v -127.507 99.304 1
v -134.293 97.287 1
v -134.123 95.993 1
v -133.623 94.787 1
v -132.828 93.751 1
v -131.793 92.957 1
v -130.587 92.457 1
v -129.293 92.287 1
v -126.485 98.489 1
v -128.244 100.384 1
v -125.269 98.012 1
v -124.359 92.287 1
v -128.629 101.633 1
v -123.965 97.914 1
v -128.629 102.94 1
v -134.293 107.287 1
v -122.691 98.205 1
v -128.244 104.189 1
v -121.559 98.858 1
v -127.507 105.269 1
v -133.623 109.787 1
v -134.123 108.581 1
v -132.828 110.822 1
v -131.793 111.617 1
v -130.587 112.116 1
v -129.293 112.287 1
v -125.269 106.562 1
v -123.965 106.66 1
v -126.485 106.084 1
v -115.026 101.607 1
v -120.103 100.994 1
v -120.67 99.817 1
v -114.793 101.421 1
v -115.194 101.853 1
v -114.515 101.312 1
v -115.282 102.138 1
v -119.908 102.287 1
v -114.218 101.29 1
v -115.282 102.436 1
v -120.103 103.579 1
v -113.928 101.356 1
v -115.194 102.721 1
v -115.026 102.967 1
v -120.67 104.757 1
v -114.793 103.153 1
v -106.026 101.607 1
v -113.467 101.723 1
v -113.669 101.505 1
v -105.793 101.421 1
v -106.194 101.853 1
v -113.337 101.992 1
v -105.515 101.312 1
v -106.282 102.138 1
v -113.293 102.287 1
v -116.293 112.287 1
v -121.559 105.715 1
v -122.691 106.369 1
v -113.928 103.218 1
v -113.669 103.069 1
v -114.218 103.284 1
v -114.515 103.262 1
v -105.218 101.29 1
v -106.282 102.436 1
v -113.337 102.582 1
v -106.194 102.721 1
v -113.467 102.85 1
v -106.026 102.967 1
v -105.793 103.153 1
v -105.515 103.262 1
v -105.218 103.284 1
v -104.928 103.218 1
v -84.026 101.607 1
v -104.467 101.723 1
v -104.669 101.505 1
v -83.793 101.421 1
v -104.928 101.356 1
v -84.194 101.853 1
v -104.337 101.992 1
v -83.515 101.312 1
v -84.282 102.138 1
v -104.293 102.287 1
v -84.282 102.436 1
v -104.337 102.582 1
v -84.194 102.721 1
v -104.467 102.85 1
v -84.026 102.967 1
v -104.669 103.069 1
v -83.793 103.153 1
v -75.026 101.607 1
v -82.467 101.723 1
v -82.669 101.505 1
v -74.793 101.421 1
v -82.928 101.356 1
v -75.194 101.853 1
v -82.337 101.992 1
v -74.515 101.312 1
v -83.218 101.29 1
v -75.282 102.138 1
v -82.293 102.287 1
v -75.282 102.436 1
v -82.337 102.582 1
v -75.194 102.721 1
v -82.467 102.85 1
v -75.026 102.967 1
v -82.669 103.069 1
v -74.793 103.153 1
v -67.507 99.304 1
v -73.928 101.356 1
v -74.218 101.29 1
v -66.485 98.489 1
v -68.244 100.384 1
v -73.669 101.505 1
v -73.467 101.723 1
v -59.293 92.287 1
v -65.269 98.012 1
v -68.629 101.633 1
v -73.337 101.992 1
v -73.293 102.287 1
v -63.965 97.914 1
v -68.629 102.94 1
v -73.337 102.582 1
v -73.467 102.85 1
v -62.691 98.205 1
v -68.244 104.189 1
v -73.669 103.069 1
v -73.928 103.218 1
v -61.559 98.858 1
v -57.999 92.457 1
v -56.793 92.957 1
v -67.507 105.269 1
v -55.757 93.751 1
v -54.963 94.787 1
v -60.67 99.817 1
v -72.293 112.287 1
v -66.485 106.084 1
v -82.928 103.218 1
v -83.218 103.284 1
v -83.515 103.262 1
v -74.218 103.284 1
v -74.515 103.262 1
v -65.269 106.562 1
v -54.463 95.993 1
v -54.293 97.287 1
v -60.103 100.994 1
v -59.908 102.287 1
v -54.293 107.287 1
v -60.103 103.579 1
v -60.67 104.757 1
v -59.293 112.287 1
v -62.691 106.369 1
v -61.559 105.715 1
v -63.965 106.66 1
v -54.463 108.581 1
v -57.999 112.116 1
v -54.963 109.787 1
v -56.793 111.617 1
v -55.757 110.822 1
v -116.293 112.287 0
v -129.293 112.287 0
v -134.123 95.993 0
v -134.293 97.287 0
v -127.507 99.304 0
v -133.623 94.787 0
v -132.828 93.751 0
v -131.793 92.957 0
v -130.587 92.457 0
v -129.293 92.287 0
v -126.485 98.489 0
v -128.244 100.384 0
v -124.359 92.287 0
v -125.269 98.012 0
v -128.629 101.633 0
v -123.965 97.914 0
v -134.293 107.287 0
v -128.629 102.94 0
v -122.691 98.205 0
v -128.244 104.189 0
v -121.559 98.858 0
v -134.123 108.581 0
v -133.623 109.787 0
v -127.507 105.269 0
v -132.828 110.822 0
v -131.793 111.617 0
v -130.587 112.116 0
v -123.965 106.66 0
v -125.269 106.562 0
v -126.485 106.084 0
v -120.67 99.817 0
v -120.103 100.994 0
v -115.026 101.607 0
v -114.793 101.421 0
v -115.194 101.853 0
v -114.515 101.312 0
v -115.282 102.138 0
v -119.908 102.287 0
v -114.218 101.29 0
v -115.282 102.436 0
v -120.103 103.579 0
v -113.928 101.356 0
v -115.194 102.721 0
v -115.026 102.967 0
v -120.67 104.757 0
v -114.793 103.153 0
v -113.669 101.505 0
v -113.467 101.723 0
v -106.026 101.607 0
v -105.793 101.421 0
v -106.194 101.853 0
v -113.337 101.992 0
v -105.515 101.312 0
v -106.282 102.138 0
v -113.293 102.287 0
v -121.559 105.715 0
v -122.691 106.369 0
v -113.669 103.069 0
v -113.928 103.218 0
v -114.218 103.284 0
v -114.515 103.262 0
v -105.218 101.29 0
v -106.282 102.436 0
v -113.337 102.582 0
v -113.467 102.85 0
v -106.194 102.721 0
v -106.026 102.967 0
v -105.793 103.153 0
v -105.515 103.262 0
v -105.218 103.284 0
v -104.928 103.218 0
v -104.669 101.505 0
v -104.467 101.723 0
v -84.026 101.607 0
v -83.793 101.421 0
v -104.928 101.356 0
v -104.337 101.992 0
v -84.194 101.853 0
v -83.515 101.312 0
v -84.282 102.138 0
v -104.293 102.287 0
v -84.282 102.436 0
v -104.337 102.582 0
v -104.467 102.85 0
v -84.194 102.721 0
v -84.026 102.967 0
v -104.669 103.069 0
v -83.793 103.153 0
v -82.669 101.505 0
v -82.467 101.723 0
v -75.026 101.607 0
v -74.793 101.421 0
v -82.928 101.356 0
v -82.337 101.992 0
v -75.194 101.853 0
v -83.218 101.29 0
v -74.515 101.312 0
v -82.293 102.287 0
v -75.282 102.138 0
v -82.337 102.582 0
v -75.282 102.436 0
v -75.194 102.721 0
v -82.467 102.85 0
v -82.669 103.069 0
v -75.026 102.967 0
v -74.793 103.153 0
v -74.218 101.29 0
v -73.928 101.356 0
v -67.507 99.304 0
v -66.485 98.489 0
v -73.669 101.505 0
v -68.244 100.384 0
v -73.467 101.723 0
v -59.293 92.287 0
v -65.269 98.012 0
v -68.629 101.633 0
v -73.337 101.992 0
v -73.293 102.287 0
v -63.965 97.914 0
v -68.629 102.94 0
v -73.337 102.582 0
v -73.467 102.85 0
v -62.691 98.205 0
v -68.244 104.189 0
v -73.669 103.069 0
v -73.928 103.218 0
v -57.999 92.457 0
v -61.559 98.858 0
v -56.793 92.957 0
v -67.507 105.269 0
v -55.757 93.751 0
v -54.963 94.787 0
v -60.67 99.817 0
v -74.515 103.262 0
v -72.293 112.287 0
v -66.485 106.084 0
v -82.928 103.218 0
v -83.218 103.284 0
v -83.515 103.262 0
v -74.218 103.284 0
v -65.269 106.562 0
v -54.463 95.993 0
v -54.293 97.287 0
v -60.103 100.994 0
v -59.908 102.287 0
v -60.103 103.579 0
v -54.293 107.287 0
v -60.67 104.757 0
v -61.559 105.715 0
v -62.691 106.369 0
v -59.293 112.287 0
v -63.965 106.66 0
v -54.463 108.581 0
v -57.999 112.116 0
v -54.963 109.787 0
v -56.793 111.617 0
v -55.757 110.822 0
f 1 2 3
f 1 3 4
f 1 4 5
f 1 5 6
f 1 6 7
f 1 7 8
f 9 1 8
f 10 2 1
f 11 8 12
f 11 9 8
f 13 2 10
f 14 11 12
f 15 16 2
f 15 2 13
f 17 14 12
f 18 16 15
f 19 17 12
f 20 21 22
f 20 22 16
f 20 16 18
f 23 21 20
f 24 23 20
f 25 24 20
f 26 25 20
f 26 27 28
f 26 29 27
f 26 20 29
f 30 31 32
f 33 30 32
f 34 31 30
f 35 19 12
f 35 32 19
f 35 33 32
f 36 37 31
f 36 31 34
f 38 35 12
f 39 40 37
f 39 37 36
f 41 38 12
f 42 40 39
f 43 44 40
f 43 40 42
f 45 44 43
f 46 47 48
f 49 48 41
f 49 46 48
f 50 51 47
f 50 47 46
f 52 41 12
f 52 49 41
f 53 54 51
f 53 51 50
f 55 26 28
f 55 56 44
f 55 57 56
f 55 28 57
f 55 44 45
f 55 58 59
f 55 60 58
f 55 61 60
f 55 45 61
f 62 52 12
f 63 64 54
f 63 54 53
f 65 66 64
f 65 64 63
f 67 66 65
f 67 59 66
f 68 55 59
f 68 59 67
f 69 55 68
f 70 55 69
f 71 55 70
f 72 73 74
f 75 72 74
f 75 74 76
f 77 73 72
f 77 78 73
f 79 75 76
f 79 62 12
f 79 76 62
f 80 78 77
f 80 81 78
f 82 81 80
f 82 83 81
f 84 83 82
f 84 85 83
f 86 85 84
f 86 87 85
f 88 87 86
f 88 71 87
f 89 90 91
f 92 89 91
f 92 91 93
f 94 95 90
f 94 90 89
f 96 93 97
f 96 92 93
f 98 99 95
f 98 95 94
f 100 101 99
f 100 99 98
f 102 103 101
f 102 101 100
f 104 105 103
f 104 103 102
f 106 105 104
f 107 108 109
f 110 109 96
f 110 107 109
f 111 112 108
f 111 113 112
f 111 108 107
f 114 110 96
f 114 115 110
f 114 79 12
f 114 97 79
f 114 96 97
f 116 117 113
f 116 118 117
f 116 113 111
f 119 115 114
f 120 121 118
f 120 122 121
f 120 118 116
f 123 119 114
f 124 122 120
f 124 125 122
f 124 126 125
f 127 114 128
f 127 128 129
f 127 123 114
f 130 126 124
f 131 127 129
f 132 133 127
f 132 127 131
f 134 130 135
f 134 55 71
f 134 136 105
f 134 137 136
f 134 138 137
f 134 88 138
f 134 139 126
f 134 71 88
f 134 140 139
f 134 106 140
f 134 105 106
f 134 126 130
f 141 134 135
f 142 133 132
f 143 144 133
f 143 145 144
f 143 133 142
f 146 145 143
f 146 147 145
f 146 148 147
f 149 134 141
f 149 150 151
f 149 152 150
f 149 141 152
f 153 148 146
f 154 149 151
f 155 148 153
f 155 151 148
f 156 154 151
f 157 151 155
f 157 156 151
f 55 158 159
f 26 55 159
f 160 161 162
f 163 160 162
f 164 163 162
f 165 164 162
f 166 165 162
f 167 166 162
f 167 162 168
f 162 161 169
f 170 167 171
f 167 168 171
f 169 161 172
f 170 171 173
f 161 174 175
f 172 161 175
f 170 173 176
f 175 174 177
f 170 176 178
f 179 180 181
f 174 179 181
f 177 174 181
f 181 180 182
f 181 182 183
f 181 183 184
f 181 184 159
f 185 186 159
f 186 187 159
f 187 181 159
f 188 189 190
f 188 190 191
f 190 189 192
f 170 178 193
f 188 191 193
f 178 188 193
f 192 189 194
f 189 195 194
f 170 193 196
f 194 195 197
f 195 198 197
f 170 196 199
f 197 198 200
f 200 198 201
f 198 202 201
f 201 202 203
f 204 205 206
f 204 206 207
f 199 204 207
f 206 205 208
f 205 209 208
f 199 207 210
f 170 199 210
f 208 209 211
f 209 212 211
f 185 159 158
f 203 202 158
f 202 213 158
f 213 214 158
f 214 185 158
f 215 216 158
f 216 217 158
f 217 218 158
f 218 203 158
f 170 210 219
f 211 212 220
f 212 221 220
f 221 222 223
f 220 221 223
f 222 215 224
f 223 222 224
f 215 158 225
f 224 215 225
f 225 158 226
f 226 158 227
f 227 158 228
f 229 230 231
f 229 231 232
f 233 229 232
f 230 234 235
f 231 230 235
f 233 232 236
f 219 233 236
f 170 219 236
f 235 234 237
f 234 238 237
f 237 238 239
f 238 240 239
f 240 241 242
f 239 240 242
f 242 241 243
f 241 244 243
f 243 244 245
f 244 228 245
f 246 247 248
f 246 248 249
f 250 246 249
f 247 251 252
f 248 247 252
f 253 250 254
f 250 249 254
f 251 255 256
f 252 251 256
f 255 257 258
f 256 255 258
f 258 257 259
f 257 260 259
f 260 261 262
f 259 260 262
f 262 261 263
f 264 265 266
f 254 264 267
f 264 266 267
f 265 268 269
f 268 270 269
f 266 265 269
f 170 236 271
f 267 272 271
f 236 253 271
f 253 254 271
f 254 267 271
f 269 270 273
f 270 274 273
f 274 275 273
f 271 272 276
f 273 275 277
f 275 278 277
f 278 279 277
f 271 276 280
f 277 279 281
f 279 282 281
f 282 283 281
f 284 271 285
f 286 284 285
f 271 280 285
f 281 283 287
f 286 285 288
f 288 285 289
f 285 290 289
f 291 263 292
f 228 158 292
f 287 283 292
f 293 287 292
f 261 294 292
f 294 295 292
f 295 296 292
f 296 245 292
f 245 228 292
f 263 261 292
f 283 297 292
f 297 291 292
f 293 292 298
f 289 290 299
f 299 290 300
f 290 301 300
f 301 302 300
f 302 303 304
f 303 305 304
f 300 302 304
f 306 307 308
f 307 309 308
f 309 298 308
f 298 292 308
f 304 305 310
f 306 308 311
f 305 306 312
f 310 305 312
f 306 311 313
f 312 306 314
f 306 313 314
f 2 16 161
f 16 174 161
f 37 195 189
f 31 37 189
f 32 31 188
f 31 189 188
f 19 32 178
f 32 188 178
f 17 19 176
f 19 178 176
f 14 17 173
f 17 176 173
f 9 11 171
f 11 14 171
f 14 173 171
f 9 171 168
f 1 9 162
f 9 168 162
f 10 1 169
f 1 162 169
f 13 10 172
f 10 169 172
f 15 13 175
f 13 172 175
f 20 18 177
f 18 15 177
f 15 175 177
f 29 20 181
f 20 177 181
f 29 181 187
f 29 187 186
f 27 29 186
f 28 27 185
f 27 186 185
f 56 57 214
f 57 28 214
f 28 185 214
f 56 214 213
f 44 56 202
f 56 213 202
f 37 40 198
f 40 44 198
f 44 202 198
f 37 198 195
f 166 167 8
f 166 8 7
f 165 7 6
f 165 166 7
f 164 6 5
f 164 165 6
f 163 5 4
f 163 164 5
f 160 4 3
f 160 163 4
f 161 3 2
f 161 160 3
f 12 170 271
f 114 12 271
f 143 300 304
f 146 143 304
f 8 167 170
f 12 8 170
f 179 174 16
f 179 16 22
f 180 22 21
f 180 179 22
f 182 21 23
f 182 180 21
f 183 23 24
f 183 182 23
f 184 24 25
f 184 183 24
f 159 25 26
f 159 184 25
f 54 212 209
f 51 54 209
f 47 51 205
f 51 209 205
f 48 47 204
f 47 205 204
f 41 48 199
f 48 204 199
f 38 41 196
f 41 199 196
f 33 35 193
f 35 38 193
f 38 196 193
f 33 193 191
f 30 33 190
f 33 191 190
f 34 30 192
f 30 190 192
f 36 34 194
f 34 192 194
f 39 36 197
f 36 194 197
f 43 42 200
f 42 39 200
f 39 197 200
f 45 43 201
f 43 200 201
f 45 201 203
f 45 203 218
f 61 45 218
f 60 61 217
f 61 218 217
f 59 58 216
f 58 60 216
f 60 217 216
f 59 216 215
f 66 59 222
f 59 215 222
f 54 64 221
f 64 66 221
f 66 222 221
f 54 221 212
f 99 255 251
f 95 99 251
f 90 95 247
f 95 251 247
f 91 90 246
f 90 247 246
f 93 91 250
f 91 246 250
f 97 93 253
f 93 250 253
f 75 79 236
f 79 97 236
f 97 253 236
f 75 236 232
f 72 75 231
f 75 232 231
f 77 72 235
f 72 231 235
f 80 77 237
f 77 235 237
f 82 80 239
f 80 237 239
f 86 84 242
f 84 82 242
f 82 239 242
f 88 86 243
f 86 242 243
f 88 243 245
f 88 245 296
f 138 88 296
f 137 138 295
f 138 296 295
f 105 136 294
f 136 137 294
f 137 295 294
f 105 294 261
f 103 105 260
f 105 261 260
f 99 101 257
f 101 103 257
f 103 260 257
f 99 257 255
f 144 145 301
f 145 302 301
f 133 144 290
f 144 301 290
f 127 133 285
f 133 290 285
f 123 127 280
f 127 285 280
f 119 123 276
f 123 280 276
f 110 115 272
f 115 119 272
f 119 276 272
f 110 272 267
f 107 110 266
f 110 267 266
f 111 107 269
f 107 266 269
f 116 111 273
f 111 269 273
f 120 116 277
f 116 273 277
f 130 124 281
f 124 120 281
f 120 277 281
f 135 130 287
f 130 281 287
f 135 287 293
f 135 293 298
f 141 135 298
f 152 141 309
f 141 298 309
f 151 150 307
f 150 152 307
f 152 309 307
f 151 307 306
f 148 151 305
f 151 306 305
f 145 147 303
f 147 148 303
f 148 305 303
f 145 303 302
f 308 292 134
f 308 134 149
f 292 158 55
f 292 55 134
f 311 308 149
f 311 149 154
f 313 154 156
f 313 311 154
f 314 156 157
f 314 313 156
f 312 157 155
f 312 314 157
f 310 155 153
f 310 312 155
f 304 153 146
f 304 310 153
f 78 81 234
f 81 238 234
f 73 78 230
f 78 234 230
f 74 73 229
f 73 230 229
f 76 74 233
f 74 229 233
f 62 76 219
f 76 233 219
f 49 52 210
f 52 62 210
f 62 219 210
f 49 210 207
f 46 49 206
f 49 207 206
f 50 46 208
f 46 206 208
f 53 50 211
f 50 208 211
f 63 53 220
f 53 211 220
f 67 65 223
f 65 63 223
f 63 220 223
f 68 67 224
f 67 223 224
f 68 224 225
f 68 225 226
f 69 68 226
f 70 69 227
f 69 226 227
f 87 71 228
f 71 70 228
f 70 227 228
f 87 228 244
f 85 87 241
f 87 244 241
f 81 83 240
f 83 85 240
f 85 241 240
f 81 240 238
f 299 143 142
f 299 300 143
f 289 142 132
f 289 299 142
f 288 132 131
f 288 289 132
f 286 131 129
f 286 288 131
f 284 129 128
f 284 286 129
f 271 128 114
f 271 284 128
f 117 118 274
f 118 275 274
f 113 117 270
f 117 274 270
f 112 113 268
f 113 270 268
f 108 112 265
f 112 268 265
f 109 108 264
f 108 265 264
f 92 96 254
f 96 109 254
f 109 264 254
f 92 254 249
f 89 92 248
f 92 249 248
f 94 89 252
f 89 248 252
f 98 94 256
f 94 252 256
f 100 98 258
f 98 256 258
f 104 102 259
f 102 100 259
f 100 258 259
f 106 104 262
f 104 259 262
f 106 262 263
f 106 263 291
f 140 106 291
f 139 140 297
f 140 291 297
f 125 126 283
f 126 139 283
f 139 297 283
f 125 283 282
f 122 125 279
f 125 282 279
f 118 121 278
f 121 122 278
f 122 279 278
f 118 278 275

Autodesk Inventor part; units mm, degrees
ref_plane "YZ Plane" through (0, 0, 0) normal (1, 0, 0) x (0, 1, 0)
ref_plane "XZ Plane" through (0, 0, 0) normal (0, 1, 0) x (-1, 0, 0)
ref_plane "XY Plane" through (0, 0, 0) normal (0, 0, 1) x (1, 0, 0)
sketch "Sketch1" plane through (0, 0, 0) normal (0, 0, 1) x (1, 0, 0)
  circle A0 centre (-124.2929, 102.2868) radius 4.385
  circle A1 centre (-64.2929, 102.2868) radius 4.385
  line L0 (-116.2929, 112.2868) -> (-59.2929, 112.2868)
  line L1 (-129.2929, 92.2868) -> (-59.2929, 92.2868)
  line L2 (-124.3591, 92.2868) -> (-129.2929, 92.2868)
  line L3 (-134.2929, 107.2868) -> (-134.2929, 97.2868)
  line L4 (-54.2929, 97.2868) -> (-54.2929, 107.2868)
  arc A2 (-129.2929, 112.2868) -> (-134.2929, 107.2868) centre (-129.2929, 107.2868) ccw
  arc A3 (-134.2929, 97.2868) -> (-129.2929, 92.2868) centre (-129.2929, 97.2868) ccw
  arc A4 (-59.2929, 92.2868) -> (-54.2929, 97.2868) centre (-59.2929, 97.2868) ccw
  arc A5 (-54.2929, 107.2868) -> (-59.2929, 112.2868) centre (-59.2929, 107.2868) ccw
  line L5 (-59.2929, 112.2868) -> (-72.2929, 112.2868)
  line L6 (-116.2929, 112.2868) -> (-129.2929, 112.2868)
  circle A6 centre (-114.2929, 102.2868) radius 1
  circle A7 centre (-105.2929, 102.2868) radius 1
  circle A8 centre (-74.2929, 102.2868) radius 1
  circle A9 centre (-83.2929, 102.2868) radius 1
  point P0 (-126.1429, 102.2868)
  point P1 (-79.2929, 92.2868)
  dimension "d109" = 10
  dimension "d110" = 10
  dimension "d111" = 8.77
  dimension "d112" = 8.77
  dimension "d113" = 2
  dimension "d114" = 2
  dimension "d115" = 10
  dimension "d116" = 9
  dimension "d117" = 2
  dimension "d118" = 2
  dimension "d119" = 10
  dimension "d120" = 9
  dimension "d121" = 60
  dimension "d126" = 10
  dimension "d401" = 20
extrude "Extrusion1" add sketch "Sketch1" along normal blind 1
properties part number "sketch femur 6 cm"
